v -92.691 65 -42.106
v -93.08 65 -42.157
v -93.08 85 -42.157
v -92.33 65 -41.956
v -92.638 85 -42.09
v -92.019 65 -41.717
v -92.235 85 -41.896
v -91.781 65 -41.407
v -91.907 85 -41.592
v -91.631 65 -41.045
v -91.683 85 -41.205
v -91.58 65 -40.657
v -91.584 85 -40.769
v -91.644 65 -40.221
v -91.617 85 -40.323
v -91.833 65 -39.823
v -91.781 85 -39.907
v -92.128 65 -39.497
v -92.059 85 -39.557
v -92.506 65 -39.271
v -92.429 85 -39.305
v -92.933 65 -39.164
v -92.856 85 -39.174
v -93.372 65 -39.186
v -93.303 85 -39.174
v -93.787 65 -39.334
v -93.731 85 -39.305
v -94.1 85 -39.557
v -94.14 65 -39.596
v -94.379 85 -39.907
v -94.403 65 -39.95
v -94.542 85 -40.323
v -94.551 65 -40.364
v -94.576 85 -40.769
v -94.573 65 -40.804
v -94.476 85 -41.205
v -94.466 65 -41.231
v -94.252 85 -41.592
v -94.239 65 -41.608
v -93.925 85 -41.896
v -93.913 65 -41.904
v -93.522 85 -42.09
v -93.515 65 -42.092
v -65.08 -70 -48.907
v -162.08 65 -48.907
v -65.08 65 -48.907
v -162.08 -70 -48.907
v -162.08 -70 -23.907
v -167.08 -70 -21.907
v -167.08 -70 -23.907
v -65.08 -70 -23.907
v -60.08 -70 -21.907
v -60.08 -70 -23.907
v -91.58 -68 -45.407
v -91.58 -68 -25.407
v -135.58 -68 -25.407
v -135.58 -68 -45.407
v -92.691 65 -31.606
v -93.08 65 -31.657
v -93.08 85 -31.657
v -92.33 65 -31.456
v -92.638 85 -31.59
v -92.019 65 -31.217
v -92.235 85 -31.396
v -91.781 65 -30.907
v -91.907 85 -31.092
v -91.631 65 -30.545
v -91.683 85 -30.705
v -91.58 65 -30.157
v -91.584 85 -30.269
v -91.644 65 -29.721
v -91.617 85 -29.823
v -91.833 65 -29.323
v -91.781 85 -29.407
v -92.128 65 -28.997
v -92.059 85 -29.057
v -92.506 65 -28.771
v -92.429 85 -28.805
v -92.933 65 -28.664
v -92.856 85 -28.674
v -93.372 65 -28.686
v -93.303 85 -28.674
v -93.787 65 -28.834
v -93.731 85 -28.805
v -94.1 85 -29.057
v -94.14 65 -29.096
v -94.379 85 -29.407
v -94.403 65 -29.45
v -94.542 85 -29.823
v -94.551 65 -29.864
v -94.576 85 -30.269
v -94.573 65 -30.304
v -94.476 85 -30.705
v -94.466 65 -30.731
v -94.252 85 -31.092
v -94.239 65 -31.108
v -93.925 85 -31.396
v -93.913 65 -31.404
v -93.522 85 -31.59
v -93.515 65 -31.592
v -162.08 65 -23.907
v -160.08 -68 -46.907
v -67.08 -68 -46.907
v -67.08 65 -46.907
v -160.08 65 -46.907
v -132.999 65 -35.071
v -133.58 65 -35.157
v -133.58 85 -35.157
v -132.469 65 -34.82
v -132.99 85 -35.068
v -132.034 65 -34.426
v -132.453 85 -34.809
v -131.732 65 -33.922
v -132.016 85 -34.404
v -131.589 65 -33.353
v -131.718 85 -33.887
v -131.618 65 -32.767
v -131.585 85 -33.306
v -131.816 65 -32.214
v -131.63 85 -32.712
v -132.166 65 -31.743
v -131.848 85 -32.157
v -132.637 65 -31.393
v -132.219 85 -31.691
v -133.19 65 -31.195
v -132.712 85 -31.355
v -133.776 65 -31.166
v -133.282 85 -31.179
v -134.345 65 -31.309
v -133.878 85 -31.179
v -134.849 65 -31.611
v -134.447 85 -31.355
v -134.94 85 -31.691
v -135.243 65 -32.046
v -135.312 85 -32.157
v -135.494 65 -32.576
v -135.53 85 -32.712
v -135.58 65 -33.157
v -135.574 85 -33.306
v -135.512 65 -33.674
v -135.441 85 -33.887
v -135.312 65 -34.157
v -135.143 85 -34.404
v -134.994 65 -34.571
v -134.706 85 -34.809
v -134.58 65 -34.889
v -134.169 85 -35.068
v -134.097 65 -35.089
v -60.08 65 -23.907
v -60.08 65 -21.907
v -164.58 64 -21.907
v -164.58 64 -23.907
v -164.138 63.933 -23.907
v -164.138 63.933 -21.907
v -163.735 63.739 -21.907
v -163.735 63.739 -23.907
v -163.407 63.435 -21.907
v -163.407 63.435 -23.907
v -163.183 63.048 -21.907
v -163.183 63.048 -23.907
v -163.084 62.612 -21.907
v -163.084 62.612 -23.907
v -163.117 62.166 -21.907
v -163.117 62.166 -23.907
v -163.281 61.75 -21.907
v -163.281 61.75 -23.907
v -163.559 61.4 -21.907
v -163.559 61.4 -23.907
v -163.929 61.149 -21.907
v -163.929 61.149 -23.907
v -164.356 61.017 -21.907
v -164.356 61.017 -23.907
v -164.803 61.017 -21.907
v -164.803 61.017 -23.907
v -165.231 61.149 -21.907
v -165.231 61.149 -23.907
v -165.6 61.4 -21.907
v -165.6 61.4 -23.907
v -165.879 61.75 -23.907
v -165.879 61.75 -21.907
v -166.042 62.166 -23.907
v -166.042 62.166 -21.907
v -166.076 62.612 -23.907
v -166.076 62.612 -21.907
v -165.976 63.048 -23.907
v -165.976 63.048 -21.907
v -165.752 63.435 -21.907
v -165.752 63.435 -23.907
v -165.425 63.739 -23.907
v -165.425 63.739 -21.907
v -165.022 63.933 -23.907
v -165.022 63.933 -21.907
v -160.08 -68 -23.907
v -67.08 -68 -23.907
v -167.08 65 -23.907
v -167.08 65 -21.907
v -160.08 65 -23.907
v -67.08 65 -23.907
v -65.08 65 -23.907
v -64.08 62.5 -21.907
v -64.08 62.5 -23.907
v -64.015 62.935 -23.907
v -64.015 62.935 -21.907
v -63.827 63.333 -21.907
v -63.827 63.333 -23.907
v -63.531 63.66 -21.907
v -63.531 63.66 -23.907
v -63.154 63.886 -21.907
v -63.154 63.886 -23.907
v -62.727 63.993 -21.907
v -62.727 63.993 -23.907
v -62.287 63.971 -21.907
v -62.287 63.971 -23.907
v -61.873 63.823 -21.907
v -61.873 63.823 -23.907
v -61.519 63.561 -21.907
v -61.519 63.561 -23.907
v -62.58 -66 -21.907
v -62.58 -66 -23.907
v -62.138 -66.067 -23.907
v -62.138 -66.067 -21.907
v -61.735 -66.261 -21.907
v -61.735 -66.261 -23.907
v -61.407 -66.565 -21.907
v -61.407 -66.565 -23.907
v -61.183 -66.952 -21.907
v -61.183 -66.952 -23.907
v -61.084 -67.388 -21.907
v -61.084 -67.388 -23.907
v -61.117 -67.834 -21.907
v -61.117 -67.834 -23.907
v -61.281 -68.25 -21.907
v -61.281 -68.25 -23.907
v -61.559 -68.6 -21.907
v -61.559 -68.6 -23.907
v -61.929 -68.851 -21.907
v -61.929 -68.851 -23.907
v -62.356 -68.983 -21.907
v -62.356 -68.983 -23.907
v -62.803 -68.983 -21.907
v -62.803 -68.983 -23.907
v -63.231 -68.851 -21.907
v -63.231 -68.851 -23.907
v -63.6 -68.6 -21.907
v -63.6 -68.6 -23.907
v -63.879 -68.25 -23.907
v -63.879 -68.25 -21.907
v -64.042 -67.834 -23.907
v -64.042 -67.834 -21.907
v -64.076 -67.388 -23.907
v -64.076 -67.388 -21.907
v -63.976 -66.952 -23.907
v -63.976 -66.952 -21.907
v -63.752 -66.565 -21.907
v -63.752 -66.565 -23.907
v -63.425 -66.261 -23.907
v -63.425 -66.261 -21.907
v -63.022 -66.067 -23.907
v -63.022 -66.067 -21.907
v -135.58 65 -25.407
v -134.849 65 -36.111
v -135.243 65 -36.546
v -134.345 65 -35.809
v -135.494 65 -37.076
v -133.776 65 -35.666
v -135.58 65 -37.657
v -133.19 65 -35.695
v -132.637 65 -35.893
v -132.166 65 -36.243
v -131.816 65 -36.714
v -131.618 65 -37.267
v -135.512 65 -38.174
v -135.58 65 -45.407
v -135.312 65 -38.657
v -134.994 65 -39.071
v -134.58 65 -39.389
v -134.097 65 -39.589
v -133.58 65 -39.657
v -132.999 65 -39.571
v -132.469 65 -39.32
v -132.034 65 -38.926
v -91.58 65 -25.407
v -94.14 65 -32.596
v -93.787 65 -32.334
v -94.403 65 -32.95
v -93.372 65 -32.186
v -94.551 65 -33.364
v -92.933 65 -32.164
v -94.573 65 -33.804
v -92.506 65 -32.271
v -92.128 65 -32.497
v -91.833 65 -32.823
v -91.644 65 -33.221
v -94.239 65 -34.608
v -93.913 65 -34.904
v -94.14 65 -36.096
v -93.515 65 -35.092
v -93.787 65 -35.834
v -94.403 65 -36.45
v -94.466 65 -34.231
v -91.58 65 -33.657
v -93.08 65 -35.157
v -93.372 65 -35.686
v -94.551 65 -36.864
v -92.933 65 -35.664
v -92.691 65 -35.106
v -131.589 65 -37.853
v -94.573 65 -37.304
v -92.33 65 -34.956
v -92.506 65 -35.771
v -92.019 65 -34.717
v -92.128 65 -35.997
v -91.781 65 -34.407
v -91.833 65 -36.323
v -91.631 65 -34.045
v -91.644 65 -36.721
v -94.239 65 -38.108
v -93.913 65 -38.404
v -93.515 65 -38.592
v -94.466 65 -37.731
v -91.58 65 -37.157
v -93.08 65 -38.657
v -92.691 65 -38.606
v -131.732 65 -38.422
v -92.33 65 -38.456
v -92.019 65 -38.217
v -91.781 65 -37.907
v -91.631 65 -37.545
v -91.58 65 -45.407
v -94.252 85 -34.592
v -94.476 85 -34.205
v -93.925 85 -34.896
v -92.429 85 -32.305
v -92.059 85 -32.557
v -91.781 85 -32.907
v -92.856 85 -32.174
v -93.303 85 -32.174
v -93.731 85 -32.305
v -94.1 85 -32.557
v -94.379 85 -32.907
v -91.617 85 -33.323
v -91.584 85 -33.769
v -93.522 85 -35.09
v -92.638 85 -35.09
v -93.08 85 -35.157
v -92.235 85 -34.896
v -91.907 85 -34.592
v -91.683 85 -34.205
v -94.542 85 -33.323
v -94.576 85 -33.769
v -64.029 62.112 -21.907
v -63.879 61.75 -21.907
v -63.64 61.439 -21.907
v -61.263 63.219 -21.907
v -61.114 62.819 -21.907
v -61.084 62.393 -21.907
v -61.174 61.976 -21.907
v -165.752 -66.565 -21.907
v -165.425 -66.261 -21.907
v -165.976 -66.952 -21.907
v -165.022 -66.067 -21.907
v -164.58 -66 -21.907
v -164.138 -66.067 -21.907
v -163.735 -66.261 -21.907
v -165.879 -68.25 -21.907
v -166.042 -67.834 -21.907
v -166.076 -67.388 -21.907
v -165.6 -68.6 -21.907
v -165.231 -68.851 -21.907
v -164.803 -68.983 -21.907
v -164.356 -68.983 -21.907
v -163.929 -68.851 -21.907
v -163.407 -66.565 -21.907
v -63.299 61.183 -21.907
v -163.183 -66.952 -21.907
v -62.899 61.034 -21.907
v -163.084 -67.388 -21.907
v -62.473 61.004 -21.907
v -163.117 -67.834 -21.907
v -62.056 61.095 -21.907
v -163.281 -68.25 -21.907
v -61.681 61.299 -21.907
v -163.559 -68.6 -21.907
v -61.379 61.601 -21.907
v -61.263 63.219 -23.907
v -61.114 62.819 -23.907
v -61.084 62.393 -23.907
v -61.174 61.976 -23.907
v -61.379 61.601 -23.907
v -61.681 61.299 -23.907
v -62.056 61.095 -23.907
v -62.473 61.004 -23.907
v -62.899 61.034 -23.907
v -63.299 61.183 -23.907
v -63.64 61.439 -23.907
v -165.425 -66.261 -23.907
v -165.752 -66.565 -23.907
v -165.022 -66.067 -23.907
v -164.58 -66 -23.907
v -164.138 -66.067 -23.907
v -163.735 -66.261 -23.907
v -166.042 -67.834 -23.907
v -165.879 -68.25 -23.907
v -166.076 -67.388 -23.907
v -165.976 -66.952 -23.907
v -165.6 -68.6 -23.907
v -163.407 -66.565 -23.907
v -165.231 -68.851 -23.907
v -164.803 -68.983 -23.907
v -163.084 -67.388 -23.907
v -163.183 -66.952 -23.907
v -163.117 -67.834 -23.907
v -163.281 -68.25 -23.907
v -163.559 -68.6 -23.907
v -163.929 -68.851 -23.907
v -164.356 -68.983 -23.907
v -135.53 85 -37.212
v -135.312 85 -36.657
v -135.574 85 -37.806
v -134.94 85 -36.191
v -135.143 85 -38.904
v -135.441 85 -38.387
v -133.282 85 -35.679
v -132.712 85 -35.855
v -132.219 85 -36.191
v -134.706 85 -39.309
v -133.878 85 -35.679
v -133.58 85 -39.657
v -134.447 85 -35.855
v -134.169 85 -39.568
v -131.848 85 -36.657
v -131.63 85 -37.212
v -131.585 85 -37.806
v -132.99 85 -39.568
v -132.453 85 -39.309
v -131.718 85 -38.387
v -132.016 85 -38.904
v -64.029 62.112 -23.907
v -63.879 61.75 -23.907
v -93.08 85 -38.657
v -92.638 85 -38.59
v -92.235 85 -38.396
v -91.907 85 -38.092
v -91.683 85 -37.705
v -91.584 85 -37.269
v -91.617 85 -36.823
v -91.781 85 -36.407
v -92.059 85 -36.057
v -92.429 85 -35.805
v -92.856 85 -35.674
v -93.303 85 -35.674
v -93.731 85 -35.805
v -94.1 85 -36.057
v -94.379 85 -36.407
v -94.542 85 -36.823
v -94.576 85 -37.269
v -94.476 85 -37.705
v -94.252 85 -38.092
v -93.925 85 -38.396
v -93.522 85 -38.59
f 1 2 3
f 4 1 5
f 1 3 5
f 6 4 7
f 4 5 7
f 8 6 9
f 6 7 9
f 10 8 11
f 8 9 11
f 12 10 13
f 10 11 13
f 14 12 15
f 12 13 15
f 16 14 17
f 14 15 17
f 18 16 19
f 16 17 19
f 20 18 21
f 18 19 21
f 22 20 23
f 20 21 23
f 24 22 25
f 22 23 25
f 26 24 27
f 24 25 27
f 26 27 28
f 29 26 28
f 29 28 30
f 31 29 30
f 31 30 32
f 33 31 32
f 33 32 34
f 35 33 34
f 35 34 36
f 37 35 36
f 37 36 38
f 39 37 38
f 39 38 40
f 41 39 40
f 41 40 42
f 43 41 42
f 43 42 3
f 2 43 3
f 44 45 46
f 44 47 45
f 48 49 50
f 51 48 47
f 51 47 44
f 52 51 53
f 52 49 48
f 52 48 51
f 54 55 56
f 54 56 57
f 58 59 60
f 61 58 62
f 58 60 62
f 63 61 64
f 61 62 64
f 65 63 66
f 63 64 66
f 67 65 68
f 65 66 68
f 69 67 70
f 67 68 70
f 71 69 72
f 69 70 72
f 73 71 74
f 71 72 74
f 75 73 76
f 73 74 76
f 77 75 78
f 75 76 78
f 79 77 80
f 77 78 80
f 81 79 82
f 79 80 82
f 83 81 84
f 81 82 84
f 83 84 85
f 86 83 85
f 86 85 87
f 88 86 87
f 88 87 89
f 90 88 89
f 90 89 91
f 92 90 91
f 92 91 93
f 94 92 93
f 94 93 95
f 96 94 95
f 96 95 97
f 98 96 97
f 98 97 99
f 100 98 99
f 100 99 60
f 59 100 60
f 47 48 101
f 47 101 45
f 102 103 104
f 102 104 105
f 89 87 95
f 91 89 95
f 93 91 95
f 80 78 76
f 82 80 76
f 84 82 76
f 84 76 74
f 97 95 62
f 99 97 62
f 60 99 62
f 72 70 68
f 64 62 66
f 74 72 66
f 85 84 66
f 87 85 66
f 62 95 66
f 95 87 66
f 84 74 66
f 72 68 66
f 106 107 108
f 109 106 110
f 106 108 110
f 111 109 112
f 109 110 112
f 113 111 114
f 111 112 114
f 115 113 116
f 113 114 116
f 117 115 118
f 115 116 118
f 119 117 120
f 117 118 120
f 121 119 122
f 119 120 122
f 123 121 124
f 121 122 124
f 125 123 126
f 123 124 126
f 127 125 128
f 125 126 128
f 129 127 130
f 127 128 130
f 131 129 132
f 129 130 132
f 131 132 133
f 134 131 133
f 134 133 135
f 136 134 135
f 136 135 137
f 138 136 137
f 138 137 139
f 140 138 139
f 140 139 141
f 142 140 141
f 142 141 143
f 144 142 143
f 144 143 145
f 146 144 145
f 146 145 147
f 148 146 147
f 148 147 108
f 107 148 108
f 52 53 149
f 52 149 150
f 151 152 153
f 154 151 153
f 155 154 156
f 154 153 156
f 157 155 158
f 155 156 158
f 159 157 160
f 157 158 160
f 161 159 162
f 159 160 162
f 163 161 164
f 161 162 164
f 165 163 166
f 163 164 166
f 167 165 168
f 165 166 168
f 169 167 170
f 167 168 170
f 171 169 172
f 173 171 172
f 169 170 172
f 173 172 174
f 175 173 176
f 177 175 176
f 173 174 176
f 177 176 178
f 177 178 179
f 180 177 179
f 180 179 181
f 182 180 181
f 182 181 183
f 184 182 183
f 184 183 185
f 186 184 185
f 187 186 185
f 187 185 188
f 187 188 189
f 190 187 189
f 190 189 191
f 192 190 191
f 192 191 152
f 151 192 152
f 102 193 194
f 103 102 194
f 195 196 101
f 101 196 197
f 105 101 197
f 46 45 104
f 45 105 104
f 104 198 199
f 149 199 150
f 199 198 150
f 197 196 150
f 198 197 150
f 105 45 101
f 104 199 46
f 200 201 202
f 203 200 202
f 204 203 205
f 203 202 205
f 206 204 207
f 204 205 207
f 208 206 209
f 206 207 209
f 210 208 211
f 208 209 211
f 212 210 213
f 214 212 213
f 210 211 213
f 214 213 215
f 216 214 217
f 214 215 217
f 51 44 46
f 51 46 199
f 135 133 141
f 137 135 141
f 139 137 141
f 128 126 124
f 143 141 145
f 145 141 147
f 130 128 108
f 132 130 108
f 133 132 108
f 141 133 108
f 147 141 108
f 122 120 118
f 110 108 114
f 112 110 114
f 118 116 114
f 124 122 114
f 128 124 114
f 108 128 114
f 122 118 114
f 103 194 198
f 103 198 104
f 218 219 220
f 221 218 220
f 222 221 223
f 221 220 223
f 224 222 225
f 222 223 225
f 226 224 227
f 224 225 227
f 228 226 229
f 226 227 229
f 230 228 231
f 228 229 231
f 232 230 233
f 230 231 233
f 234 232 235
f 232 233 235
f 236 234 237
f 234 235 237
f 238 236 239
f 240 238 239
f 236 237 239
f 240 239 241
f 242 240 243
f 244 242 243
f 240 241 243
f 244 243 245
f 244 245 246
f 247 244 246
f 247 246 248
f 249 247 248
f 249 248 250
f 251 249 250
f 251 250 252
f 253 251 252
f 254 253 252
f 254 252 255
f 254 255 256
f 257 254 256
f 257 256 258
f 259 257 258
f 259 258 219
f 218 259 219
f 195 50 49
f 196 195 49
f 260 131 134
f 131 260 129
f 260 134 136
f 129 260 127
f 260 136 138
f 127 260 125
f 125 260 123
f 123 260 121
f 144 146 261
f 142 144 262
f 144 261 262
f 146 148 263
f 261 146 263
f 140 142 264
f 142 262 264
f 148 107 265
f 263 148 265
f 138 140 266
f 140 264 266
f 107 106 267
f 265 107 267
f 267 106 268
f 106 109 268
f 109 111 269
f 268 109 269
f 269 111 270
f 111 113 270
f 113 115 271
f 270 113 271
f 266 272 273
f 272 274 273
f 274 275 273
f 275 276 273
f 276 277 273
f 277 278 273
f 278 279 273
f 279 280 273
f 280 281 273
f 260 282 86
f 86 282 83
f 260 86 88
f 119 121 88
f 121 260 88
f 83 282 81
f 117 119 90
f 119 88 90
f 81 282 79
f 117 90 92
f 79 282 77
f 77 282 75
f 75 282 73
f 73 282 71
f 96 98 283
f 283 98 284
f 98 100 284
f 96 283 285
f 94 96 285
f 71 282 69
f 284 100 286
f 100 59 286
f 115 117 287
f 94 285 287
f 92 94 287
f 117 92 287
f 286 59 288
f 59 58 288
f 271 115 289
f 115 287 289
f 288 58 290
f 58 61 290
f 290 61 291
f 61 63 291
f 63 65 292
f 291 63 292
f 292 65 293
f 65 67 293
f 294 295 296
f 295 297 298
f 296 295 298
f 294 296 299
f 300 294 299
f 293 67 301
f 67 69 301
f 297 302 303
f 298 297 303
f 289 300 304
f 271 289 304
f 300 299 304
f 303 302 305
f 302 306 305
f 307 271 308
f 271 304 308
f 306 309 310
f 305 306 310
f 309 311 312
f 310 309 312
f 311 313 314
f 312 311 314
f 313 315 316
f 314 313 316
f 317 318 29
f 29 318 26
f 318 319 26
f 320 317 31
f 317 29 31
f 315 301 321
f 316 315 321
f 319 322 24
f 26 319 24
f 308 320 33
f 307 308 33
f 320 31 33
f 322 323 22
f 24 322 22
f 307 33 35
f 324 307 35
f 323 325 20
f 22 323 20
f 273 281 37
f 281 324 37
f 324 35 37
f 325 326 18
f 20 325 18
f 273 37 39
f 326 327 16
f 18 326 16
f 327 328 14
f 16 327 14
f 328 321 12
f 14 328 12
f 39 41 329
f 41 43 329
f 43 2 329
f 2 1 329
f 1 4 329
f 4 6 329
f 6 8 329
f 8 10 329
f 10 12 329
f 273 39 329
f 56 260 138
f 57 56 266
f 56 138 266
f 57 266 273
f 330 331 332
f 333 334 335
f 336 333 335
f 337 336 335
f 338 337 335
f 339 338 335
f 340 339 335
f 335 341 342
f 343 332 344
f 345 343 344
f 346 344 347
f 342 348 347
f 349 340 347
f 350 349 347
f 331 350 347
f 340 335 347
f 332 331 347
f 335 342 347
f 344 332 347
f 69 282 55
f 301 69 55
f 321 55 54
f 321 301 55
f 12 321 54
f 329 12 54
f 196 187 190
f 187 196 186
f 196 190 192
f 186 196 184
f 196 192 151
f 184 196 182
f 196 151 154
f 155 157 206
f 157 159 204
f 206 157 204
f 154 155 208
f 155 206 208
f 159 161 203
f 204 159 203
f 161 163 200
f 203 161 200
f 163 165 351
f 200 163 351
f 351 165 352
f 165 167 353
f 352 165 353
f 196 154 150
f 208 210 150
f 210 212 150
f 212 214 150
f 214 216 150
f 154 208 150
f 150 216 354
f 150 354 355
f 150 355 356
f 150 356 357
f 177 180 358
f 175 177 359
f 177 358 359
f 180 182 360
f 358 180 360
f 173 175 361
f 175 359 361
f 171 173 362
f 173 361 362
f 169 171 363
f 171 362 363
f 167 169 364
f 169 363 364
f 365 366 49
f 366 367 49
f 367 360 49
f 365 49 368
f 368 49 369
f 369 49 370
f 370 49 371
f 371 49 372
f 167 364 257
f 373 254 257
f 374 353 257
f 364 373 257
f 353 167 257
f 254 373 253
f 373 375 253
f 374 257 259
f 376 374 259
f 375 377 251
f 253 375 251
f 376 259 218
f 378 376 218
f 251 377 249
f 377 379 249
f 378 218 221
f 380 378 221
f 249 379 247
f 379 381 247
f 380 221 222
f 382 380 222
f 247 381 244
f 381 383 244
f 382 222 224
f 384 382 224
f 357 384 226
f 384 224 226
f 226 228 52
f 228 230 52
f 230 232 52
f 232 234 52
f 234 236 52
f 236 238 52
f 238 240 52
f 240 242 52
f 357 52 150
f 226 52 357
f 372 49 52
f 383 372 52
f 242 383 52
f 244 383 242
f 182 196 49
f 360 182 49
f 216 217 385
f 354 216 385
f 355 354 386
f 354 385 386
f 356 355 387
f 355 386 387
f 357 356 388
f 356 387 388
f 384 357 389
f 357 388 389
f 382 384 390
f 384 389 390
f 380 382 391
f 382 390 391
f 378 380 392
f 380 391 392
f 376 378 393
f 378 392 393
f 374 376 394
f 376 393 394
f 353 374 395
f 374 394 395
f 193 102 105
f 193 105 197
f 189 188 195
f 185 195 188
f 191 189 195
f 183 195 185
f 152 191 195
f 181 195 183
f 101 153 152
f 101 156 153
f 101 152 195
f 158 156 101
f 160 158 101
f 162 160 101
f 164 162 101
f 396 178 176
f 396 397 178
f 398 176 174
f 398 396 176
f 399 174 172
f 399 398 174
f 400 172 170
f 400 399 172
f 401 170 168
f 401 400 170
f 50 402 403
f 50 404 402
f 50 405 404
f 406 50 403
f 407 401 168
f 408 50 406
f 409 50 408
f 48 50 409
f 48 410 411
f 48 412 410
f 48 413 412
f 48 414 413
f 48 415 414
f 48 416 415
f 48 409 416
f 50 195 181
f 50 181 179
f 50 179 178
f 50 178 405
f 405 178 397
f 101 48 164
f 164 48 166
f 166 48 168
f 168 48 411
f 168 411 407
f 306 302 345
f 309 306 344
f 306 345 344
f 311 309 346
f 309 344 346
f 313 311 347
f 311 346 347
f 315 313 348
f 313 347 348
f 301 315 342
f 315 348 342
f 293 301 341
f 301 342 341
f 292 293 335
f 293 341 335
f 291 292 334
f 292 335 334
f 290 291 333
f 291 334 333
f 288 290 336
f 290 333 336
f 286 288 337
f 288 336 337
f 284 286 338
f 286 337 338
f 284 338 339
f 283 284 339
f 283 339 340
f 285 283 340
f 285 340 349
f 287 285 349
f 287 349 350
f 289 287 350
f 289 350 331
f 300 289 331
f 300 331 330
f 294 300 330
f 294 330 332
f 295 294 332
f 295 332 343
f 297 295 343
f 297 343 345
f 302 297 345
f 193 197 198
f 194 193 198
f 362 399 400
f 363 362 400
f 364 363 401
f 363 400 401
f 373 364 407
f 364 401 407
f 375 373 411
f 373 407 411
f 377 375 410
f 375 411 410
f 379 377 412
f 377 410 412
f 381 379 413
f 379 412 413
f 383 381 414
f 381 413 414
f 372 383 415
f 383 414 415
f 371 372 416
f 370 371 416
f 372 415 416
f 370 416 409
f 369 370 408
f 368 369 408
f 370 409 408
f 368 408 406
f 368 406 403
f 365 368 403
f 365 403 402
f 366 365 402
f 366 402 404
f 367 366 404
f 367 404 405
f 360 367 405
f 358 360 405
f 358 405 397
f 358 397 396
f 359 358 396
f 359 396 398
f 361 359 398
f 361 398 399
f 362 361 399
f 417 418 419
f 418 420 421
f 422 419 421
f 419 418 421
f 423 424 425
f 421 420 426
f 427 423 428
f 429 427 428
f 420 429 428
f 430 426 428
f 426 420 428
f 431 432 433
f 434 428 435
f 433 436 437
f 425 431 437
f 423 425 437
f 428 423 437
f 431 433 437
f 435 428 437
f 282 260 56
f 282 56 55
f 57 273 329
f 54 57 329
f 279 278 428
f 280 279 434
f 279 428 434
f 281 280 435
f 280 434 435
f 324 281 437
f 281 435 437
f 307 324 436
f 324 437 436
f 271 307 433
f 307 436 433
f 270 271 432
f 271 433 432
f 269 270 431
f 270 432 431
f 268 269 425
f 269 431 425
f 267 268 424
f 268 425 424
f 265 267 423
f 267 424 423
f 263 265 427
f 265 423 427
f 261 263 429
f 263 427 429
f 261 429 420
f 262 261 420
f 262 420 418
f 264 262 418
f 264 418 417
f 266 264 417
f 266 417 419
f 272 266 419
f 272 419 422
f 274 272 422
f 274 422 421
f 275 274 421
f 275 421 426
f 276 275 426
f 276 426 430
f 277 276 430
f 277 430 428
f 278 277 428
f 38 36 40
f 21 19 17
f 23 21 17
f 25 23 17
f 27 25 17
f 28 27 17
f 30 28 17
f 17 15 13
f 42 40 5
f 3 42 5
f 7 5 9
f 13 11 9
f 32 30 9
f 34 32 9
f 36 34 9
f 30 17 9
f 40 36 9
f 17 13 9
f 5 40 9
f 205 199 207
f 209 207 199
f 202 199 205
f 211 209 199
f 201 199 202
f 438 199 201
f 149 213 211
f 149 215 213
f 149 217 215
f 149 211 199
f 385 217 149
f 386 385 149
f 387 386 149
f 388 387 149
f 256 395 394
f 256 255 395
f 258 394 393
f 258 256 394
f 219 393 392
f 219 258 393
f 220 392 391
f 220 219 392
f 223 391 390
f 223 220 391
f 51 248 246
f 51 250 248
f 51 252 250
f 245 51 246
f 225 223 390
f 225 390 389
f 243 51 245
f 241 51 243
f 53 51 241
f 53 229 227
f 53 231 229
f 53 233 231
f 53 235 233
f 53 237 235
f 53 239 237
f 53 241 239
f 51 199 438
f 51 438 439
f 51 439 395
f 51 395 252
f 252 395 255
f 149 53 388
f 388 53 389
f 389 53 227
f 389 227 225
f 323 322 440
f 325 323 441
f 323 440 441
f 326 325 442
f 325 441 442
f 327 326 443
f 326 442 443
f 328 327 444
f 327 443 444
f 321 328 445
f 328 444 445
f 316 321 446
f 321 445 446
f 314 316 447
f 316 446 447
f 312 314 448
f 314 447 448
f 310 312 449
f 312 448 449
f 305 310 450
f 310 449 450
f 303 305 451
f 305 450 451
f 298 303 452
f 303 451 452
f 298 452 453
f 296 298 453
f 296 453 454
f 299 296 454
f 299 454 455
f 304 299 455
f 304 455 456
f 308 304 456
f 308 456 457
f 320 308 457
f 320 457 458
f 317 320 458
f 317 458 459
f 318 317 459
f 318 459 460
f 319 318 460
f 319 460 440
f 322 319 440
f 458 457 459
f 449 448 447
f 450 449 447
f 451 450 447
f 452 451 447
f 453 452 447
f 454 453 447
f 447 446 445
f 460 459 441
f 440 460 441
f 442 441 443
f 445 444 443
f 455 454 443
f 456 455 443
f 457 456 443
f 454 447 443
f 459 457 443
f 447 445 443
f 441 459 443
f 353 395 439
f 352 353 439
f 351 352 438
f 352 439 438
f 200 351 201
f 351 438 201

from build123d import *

# Parameters (mm, degrees)
ZEE3200MAH_START         = -170.079725428
ZEE3200MAH_OUTLINE_W     = 20
ZEE3200MAH_OUTLINE_H     = 44
ZEE3200MAH_DEPTH         = 133
ZEE3200MAH_START_2       = -190.079725428
ZEE3200MAH_2_OUTLINE_R   = 1.5
ZEE3200MAH_2_OUTLINE_R_2 = 2
ZEE3200MAH_2_DEPTH       = 20
BODY_MOVE_COPY1_ANGLE    = 120
SKETCH2_W                = 97
SKETCH2_H                = 27
BOSS_EXTRUDE1_DEPTH      = 2
SKETCH2_3_W              = 2
SKETCH2_3_H              = 2
BOSS_EXTRUDE2_DEPTH      = 133
SKETCH4_W                = 5
SKETCH4_H                = 1
SKETCH4_H_2              = 2
BOSS_EXTRUDE4_DEPTH      = 135
SKETCH7_R                = 1.5
CUT_EXTRUDE2_DEPTH       = 190.118044219


# Read off the part's stored shape, not the designer's step: Zee3200mah
with BuildPart() as part:
    # Zee3200mah outline → Zee3200mah (new body)
    with BuildSketch(Plane.YZ.offset(ZEE3200MAH_START)):
        with Locations((10, -33.906773899)):
            Rectangle(ZEE3200MAH_OUTLINE_W, ZEE3200MAH_OUTLINE_H)
    extrude(amount=ZEE3200MAH_DEPTH)

    # Zee3200mah 2 outline → Zee3200mah 2 (add)
    with BuildSketch(Plane.YZ.offset(ZEE3200MAH_START_2)):
        with Locations((15.25, -13.406773899)):
            Circle(ZEE3200MAH_2_OUTLINE_R)
        with Locations((11.75, -13.406773899)):
            Circle(ZEE3200MAH_2_OUTLINE_R)
        with Locations((8.25, -13.406773899)):
            Circle(ZEE3200MAH_2_OUTLINE_R)
        with Locations((4.75, -13.406773899)):
            Circle(ZEE3200MAH_2_OUTLINE_R)
        with Locations((7.75, -53.906773899)):
            Circle(ZEE3200MAH_2_OUTLINE_R_2)
        with Locations((12.25, -53.906773899)):
            Circle(ZEE3200MAH_2_OUTLINE_R_2)
    extrude(amount=ZEE3200MAH_2_DEPTH)


with BuildPart() as part_1:
    # Body-Move/Copy1: moved
    add(part.part.moved(Location((0, 0, 0))).rotate(Axis((-61.584225652, -43.495499776, 18.088725876), (-0.5773502691896245, 0.5773502691896305, -0.5773502691896225)), BODY_MOVE_COPY1_ANGLE))


with BuildPart() as body_2:
    # Sketch2 → Boss-Extrude1 (new body)
    with BuildSketch(Plane.XZ.offset(68)):
        with Locations((-113.579725428, -35.406773899)):
            Rectangle(SKETCH2_W, SKETCH2_H)
    extrude(amount=BOSS_EXTRUDE1_DEPTH)

    # Sketch2<3> → Boss-Extrude2 (add)
    # profile 1 of 2: a face of its own
    with BuildSketch(Plane.XZ.offset(68)):
        Polygon((-65.079725428, -23.906773899), (-67.079725428, -23.906773899), (-67.079725428, -21.906773899), (-162.079725428, -21.906773899), (-162.079725428, -48.906773899), (-65.079725428, -48.906773899), align=None)
        Polygon((-160.079725428, -23.906773899), (-68.579725428, -23.906773899), (-67.079725428, -23.906773899), (-67.079725428, -25.406773899), (-67.079725428, -46.906773899), (-160.079725428, -46.906773899), align=None, mode=Mode.SUBTRACT)
    # profile 2 of 2: a face of its own
    with BuildSketch(Plane.XZ.offset(68)):
        with Locations((-66.079725428, -22.906773899)):
            Rectangle(SKETCH2_3_W, SKETCH2_3_H)
    extrude(amount=-BOSS_EXTRUDE2_DEPTH)

    # Sketch4 → Boss-Extrude4 (add)
    with BuildSketch(Plane.XZ.offset(70)):
        with Locations((-62.579725428, -23.406773899)):
            Rectangle(SKETCH4_W, SKETCH4_H)
        with Locations((-62.579725428, -22.406773899)):
            Rectangle(SKETCH4_W, SKETCH4_H)
        with Locations((-164.579725428, -22.906773899)):
            Rectangle(SKETCH4_W, SKETCH4_H_2)
    extrude(amount=-BOSS_EXTRUDE4_DEPTH)

    # Sketch7 → Cut-Extrude2 (cut, through all)
    with BuildSketch(Plane(origin=(0, 0, -23.906773899), x_dir=(-1, 0, 0), z_dir=(0, 0, -1))):
        with BuildLine():
            ThreePointArc((64.079725428, 62.5), (63.153750577, 63.885819299), (61.519065257, 63.560660172))
            Line((61.519065257, 63.560660172), (63.6403856, 61.439339828))
            ThreePointArc((63.6403856, 61.439339828), (63.965544727, 61.925974851), (64.079725428, 62.5))
        make_face()
        with BuildLine():
            Line((63.6403856, 61.439339828), (61.519065257, 63.560660172))
            ThreePointArc((61.519065257, 63.560660172), (61.519065257, 61.439339828), (63.6403856, 61.439339828))
        make_face()
        with Locations(Location((164.579725428, 62.5, 0), (0, 0, 90))):
            Circle(SKETCH7_R)
        with Locations(Location((62.579725428, -67.5, 0), (0, 0, 90))):
            Circle(SKETCH7_R)
        with Locations(Location((164.579725428, -67.5, 0), (0, 0, 90))):
            Circle(SKETCH7_R)
    extrude(amount=-CUT_EXTRUDE2_DEPTH, mode=Mode.SUBTRACT)


solid = Compound([part_1.part, body_2.part])
